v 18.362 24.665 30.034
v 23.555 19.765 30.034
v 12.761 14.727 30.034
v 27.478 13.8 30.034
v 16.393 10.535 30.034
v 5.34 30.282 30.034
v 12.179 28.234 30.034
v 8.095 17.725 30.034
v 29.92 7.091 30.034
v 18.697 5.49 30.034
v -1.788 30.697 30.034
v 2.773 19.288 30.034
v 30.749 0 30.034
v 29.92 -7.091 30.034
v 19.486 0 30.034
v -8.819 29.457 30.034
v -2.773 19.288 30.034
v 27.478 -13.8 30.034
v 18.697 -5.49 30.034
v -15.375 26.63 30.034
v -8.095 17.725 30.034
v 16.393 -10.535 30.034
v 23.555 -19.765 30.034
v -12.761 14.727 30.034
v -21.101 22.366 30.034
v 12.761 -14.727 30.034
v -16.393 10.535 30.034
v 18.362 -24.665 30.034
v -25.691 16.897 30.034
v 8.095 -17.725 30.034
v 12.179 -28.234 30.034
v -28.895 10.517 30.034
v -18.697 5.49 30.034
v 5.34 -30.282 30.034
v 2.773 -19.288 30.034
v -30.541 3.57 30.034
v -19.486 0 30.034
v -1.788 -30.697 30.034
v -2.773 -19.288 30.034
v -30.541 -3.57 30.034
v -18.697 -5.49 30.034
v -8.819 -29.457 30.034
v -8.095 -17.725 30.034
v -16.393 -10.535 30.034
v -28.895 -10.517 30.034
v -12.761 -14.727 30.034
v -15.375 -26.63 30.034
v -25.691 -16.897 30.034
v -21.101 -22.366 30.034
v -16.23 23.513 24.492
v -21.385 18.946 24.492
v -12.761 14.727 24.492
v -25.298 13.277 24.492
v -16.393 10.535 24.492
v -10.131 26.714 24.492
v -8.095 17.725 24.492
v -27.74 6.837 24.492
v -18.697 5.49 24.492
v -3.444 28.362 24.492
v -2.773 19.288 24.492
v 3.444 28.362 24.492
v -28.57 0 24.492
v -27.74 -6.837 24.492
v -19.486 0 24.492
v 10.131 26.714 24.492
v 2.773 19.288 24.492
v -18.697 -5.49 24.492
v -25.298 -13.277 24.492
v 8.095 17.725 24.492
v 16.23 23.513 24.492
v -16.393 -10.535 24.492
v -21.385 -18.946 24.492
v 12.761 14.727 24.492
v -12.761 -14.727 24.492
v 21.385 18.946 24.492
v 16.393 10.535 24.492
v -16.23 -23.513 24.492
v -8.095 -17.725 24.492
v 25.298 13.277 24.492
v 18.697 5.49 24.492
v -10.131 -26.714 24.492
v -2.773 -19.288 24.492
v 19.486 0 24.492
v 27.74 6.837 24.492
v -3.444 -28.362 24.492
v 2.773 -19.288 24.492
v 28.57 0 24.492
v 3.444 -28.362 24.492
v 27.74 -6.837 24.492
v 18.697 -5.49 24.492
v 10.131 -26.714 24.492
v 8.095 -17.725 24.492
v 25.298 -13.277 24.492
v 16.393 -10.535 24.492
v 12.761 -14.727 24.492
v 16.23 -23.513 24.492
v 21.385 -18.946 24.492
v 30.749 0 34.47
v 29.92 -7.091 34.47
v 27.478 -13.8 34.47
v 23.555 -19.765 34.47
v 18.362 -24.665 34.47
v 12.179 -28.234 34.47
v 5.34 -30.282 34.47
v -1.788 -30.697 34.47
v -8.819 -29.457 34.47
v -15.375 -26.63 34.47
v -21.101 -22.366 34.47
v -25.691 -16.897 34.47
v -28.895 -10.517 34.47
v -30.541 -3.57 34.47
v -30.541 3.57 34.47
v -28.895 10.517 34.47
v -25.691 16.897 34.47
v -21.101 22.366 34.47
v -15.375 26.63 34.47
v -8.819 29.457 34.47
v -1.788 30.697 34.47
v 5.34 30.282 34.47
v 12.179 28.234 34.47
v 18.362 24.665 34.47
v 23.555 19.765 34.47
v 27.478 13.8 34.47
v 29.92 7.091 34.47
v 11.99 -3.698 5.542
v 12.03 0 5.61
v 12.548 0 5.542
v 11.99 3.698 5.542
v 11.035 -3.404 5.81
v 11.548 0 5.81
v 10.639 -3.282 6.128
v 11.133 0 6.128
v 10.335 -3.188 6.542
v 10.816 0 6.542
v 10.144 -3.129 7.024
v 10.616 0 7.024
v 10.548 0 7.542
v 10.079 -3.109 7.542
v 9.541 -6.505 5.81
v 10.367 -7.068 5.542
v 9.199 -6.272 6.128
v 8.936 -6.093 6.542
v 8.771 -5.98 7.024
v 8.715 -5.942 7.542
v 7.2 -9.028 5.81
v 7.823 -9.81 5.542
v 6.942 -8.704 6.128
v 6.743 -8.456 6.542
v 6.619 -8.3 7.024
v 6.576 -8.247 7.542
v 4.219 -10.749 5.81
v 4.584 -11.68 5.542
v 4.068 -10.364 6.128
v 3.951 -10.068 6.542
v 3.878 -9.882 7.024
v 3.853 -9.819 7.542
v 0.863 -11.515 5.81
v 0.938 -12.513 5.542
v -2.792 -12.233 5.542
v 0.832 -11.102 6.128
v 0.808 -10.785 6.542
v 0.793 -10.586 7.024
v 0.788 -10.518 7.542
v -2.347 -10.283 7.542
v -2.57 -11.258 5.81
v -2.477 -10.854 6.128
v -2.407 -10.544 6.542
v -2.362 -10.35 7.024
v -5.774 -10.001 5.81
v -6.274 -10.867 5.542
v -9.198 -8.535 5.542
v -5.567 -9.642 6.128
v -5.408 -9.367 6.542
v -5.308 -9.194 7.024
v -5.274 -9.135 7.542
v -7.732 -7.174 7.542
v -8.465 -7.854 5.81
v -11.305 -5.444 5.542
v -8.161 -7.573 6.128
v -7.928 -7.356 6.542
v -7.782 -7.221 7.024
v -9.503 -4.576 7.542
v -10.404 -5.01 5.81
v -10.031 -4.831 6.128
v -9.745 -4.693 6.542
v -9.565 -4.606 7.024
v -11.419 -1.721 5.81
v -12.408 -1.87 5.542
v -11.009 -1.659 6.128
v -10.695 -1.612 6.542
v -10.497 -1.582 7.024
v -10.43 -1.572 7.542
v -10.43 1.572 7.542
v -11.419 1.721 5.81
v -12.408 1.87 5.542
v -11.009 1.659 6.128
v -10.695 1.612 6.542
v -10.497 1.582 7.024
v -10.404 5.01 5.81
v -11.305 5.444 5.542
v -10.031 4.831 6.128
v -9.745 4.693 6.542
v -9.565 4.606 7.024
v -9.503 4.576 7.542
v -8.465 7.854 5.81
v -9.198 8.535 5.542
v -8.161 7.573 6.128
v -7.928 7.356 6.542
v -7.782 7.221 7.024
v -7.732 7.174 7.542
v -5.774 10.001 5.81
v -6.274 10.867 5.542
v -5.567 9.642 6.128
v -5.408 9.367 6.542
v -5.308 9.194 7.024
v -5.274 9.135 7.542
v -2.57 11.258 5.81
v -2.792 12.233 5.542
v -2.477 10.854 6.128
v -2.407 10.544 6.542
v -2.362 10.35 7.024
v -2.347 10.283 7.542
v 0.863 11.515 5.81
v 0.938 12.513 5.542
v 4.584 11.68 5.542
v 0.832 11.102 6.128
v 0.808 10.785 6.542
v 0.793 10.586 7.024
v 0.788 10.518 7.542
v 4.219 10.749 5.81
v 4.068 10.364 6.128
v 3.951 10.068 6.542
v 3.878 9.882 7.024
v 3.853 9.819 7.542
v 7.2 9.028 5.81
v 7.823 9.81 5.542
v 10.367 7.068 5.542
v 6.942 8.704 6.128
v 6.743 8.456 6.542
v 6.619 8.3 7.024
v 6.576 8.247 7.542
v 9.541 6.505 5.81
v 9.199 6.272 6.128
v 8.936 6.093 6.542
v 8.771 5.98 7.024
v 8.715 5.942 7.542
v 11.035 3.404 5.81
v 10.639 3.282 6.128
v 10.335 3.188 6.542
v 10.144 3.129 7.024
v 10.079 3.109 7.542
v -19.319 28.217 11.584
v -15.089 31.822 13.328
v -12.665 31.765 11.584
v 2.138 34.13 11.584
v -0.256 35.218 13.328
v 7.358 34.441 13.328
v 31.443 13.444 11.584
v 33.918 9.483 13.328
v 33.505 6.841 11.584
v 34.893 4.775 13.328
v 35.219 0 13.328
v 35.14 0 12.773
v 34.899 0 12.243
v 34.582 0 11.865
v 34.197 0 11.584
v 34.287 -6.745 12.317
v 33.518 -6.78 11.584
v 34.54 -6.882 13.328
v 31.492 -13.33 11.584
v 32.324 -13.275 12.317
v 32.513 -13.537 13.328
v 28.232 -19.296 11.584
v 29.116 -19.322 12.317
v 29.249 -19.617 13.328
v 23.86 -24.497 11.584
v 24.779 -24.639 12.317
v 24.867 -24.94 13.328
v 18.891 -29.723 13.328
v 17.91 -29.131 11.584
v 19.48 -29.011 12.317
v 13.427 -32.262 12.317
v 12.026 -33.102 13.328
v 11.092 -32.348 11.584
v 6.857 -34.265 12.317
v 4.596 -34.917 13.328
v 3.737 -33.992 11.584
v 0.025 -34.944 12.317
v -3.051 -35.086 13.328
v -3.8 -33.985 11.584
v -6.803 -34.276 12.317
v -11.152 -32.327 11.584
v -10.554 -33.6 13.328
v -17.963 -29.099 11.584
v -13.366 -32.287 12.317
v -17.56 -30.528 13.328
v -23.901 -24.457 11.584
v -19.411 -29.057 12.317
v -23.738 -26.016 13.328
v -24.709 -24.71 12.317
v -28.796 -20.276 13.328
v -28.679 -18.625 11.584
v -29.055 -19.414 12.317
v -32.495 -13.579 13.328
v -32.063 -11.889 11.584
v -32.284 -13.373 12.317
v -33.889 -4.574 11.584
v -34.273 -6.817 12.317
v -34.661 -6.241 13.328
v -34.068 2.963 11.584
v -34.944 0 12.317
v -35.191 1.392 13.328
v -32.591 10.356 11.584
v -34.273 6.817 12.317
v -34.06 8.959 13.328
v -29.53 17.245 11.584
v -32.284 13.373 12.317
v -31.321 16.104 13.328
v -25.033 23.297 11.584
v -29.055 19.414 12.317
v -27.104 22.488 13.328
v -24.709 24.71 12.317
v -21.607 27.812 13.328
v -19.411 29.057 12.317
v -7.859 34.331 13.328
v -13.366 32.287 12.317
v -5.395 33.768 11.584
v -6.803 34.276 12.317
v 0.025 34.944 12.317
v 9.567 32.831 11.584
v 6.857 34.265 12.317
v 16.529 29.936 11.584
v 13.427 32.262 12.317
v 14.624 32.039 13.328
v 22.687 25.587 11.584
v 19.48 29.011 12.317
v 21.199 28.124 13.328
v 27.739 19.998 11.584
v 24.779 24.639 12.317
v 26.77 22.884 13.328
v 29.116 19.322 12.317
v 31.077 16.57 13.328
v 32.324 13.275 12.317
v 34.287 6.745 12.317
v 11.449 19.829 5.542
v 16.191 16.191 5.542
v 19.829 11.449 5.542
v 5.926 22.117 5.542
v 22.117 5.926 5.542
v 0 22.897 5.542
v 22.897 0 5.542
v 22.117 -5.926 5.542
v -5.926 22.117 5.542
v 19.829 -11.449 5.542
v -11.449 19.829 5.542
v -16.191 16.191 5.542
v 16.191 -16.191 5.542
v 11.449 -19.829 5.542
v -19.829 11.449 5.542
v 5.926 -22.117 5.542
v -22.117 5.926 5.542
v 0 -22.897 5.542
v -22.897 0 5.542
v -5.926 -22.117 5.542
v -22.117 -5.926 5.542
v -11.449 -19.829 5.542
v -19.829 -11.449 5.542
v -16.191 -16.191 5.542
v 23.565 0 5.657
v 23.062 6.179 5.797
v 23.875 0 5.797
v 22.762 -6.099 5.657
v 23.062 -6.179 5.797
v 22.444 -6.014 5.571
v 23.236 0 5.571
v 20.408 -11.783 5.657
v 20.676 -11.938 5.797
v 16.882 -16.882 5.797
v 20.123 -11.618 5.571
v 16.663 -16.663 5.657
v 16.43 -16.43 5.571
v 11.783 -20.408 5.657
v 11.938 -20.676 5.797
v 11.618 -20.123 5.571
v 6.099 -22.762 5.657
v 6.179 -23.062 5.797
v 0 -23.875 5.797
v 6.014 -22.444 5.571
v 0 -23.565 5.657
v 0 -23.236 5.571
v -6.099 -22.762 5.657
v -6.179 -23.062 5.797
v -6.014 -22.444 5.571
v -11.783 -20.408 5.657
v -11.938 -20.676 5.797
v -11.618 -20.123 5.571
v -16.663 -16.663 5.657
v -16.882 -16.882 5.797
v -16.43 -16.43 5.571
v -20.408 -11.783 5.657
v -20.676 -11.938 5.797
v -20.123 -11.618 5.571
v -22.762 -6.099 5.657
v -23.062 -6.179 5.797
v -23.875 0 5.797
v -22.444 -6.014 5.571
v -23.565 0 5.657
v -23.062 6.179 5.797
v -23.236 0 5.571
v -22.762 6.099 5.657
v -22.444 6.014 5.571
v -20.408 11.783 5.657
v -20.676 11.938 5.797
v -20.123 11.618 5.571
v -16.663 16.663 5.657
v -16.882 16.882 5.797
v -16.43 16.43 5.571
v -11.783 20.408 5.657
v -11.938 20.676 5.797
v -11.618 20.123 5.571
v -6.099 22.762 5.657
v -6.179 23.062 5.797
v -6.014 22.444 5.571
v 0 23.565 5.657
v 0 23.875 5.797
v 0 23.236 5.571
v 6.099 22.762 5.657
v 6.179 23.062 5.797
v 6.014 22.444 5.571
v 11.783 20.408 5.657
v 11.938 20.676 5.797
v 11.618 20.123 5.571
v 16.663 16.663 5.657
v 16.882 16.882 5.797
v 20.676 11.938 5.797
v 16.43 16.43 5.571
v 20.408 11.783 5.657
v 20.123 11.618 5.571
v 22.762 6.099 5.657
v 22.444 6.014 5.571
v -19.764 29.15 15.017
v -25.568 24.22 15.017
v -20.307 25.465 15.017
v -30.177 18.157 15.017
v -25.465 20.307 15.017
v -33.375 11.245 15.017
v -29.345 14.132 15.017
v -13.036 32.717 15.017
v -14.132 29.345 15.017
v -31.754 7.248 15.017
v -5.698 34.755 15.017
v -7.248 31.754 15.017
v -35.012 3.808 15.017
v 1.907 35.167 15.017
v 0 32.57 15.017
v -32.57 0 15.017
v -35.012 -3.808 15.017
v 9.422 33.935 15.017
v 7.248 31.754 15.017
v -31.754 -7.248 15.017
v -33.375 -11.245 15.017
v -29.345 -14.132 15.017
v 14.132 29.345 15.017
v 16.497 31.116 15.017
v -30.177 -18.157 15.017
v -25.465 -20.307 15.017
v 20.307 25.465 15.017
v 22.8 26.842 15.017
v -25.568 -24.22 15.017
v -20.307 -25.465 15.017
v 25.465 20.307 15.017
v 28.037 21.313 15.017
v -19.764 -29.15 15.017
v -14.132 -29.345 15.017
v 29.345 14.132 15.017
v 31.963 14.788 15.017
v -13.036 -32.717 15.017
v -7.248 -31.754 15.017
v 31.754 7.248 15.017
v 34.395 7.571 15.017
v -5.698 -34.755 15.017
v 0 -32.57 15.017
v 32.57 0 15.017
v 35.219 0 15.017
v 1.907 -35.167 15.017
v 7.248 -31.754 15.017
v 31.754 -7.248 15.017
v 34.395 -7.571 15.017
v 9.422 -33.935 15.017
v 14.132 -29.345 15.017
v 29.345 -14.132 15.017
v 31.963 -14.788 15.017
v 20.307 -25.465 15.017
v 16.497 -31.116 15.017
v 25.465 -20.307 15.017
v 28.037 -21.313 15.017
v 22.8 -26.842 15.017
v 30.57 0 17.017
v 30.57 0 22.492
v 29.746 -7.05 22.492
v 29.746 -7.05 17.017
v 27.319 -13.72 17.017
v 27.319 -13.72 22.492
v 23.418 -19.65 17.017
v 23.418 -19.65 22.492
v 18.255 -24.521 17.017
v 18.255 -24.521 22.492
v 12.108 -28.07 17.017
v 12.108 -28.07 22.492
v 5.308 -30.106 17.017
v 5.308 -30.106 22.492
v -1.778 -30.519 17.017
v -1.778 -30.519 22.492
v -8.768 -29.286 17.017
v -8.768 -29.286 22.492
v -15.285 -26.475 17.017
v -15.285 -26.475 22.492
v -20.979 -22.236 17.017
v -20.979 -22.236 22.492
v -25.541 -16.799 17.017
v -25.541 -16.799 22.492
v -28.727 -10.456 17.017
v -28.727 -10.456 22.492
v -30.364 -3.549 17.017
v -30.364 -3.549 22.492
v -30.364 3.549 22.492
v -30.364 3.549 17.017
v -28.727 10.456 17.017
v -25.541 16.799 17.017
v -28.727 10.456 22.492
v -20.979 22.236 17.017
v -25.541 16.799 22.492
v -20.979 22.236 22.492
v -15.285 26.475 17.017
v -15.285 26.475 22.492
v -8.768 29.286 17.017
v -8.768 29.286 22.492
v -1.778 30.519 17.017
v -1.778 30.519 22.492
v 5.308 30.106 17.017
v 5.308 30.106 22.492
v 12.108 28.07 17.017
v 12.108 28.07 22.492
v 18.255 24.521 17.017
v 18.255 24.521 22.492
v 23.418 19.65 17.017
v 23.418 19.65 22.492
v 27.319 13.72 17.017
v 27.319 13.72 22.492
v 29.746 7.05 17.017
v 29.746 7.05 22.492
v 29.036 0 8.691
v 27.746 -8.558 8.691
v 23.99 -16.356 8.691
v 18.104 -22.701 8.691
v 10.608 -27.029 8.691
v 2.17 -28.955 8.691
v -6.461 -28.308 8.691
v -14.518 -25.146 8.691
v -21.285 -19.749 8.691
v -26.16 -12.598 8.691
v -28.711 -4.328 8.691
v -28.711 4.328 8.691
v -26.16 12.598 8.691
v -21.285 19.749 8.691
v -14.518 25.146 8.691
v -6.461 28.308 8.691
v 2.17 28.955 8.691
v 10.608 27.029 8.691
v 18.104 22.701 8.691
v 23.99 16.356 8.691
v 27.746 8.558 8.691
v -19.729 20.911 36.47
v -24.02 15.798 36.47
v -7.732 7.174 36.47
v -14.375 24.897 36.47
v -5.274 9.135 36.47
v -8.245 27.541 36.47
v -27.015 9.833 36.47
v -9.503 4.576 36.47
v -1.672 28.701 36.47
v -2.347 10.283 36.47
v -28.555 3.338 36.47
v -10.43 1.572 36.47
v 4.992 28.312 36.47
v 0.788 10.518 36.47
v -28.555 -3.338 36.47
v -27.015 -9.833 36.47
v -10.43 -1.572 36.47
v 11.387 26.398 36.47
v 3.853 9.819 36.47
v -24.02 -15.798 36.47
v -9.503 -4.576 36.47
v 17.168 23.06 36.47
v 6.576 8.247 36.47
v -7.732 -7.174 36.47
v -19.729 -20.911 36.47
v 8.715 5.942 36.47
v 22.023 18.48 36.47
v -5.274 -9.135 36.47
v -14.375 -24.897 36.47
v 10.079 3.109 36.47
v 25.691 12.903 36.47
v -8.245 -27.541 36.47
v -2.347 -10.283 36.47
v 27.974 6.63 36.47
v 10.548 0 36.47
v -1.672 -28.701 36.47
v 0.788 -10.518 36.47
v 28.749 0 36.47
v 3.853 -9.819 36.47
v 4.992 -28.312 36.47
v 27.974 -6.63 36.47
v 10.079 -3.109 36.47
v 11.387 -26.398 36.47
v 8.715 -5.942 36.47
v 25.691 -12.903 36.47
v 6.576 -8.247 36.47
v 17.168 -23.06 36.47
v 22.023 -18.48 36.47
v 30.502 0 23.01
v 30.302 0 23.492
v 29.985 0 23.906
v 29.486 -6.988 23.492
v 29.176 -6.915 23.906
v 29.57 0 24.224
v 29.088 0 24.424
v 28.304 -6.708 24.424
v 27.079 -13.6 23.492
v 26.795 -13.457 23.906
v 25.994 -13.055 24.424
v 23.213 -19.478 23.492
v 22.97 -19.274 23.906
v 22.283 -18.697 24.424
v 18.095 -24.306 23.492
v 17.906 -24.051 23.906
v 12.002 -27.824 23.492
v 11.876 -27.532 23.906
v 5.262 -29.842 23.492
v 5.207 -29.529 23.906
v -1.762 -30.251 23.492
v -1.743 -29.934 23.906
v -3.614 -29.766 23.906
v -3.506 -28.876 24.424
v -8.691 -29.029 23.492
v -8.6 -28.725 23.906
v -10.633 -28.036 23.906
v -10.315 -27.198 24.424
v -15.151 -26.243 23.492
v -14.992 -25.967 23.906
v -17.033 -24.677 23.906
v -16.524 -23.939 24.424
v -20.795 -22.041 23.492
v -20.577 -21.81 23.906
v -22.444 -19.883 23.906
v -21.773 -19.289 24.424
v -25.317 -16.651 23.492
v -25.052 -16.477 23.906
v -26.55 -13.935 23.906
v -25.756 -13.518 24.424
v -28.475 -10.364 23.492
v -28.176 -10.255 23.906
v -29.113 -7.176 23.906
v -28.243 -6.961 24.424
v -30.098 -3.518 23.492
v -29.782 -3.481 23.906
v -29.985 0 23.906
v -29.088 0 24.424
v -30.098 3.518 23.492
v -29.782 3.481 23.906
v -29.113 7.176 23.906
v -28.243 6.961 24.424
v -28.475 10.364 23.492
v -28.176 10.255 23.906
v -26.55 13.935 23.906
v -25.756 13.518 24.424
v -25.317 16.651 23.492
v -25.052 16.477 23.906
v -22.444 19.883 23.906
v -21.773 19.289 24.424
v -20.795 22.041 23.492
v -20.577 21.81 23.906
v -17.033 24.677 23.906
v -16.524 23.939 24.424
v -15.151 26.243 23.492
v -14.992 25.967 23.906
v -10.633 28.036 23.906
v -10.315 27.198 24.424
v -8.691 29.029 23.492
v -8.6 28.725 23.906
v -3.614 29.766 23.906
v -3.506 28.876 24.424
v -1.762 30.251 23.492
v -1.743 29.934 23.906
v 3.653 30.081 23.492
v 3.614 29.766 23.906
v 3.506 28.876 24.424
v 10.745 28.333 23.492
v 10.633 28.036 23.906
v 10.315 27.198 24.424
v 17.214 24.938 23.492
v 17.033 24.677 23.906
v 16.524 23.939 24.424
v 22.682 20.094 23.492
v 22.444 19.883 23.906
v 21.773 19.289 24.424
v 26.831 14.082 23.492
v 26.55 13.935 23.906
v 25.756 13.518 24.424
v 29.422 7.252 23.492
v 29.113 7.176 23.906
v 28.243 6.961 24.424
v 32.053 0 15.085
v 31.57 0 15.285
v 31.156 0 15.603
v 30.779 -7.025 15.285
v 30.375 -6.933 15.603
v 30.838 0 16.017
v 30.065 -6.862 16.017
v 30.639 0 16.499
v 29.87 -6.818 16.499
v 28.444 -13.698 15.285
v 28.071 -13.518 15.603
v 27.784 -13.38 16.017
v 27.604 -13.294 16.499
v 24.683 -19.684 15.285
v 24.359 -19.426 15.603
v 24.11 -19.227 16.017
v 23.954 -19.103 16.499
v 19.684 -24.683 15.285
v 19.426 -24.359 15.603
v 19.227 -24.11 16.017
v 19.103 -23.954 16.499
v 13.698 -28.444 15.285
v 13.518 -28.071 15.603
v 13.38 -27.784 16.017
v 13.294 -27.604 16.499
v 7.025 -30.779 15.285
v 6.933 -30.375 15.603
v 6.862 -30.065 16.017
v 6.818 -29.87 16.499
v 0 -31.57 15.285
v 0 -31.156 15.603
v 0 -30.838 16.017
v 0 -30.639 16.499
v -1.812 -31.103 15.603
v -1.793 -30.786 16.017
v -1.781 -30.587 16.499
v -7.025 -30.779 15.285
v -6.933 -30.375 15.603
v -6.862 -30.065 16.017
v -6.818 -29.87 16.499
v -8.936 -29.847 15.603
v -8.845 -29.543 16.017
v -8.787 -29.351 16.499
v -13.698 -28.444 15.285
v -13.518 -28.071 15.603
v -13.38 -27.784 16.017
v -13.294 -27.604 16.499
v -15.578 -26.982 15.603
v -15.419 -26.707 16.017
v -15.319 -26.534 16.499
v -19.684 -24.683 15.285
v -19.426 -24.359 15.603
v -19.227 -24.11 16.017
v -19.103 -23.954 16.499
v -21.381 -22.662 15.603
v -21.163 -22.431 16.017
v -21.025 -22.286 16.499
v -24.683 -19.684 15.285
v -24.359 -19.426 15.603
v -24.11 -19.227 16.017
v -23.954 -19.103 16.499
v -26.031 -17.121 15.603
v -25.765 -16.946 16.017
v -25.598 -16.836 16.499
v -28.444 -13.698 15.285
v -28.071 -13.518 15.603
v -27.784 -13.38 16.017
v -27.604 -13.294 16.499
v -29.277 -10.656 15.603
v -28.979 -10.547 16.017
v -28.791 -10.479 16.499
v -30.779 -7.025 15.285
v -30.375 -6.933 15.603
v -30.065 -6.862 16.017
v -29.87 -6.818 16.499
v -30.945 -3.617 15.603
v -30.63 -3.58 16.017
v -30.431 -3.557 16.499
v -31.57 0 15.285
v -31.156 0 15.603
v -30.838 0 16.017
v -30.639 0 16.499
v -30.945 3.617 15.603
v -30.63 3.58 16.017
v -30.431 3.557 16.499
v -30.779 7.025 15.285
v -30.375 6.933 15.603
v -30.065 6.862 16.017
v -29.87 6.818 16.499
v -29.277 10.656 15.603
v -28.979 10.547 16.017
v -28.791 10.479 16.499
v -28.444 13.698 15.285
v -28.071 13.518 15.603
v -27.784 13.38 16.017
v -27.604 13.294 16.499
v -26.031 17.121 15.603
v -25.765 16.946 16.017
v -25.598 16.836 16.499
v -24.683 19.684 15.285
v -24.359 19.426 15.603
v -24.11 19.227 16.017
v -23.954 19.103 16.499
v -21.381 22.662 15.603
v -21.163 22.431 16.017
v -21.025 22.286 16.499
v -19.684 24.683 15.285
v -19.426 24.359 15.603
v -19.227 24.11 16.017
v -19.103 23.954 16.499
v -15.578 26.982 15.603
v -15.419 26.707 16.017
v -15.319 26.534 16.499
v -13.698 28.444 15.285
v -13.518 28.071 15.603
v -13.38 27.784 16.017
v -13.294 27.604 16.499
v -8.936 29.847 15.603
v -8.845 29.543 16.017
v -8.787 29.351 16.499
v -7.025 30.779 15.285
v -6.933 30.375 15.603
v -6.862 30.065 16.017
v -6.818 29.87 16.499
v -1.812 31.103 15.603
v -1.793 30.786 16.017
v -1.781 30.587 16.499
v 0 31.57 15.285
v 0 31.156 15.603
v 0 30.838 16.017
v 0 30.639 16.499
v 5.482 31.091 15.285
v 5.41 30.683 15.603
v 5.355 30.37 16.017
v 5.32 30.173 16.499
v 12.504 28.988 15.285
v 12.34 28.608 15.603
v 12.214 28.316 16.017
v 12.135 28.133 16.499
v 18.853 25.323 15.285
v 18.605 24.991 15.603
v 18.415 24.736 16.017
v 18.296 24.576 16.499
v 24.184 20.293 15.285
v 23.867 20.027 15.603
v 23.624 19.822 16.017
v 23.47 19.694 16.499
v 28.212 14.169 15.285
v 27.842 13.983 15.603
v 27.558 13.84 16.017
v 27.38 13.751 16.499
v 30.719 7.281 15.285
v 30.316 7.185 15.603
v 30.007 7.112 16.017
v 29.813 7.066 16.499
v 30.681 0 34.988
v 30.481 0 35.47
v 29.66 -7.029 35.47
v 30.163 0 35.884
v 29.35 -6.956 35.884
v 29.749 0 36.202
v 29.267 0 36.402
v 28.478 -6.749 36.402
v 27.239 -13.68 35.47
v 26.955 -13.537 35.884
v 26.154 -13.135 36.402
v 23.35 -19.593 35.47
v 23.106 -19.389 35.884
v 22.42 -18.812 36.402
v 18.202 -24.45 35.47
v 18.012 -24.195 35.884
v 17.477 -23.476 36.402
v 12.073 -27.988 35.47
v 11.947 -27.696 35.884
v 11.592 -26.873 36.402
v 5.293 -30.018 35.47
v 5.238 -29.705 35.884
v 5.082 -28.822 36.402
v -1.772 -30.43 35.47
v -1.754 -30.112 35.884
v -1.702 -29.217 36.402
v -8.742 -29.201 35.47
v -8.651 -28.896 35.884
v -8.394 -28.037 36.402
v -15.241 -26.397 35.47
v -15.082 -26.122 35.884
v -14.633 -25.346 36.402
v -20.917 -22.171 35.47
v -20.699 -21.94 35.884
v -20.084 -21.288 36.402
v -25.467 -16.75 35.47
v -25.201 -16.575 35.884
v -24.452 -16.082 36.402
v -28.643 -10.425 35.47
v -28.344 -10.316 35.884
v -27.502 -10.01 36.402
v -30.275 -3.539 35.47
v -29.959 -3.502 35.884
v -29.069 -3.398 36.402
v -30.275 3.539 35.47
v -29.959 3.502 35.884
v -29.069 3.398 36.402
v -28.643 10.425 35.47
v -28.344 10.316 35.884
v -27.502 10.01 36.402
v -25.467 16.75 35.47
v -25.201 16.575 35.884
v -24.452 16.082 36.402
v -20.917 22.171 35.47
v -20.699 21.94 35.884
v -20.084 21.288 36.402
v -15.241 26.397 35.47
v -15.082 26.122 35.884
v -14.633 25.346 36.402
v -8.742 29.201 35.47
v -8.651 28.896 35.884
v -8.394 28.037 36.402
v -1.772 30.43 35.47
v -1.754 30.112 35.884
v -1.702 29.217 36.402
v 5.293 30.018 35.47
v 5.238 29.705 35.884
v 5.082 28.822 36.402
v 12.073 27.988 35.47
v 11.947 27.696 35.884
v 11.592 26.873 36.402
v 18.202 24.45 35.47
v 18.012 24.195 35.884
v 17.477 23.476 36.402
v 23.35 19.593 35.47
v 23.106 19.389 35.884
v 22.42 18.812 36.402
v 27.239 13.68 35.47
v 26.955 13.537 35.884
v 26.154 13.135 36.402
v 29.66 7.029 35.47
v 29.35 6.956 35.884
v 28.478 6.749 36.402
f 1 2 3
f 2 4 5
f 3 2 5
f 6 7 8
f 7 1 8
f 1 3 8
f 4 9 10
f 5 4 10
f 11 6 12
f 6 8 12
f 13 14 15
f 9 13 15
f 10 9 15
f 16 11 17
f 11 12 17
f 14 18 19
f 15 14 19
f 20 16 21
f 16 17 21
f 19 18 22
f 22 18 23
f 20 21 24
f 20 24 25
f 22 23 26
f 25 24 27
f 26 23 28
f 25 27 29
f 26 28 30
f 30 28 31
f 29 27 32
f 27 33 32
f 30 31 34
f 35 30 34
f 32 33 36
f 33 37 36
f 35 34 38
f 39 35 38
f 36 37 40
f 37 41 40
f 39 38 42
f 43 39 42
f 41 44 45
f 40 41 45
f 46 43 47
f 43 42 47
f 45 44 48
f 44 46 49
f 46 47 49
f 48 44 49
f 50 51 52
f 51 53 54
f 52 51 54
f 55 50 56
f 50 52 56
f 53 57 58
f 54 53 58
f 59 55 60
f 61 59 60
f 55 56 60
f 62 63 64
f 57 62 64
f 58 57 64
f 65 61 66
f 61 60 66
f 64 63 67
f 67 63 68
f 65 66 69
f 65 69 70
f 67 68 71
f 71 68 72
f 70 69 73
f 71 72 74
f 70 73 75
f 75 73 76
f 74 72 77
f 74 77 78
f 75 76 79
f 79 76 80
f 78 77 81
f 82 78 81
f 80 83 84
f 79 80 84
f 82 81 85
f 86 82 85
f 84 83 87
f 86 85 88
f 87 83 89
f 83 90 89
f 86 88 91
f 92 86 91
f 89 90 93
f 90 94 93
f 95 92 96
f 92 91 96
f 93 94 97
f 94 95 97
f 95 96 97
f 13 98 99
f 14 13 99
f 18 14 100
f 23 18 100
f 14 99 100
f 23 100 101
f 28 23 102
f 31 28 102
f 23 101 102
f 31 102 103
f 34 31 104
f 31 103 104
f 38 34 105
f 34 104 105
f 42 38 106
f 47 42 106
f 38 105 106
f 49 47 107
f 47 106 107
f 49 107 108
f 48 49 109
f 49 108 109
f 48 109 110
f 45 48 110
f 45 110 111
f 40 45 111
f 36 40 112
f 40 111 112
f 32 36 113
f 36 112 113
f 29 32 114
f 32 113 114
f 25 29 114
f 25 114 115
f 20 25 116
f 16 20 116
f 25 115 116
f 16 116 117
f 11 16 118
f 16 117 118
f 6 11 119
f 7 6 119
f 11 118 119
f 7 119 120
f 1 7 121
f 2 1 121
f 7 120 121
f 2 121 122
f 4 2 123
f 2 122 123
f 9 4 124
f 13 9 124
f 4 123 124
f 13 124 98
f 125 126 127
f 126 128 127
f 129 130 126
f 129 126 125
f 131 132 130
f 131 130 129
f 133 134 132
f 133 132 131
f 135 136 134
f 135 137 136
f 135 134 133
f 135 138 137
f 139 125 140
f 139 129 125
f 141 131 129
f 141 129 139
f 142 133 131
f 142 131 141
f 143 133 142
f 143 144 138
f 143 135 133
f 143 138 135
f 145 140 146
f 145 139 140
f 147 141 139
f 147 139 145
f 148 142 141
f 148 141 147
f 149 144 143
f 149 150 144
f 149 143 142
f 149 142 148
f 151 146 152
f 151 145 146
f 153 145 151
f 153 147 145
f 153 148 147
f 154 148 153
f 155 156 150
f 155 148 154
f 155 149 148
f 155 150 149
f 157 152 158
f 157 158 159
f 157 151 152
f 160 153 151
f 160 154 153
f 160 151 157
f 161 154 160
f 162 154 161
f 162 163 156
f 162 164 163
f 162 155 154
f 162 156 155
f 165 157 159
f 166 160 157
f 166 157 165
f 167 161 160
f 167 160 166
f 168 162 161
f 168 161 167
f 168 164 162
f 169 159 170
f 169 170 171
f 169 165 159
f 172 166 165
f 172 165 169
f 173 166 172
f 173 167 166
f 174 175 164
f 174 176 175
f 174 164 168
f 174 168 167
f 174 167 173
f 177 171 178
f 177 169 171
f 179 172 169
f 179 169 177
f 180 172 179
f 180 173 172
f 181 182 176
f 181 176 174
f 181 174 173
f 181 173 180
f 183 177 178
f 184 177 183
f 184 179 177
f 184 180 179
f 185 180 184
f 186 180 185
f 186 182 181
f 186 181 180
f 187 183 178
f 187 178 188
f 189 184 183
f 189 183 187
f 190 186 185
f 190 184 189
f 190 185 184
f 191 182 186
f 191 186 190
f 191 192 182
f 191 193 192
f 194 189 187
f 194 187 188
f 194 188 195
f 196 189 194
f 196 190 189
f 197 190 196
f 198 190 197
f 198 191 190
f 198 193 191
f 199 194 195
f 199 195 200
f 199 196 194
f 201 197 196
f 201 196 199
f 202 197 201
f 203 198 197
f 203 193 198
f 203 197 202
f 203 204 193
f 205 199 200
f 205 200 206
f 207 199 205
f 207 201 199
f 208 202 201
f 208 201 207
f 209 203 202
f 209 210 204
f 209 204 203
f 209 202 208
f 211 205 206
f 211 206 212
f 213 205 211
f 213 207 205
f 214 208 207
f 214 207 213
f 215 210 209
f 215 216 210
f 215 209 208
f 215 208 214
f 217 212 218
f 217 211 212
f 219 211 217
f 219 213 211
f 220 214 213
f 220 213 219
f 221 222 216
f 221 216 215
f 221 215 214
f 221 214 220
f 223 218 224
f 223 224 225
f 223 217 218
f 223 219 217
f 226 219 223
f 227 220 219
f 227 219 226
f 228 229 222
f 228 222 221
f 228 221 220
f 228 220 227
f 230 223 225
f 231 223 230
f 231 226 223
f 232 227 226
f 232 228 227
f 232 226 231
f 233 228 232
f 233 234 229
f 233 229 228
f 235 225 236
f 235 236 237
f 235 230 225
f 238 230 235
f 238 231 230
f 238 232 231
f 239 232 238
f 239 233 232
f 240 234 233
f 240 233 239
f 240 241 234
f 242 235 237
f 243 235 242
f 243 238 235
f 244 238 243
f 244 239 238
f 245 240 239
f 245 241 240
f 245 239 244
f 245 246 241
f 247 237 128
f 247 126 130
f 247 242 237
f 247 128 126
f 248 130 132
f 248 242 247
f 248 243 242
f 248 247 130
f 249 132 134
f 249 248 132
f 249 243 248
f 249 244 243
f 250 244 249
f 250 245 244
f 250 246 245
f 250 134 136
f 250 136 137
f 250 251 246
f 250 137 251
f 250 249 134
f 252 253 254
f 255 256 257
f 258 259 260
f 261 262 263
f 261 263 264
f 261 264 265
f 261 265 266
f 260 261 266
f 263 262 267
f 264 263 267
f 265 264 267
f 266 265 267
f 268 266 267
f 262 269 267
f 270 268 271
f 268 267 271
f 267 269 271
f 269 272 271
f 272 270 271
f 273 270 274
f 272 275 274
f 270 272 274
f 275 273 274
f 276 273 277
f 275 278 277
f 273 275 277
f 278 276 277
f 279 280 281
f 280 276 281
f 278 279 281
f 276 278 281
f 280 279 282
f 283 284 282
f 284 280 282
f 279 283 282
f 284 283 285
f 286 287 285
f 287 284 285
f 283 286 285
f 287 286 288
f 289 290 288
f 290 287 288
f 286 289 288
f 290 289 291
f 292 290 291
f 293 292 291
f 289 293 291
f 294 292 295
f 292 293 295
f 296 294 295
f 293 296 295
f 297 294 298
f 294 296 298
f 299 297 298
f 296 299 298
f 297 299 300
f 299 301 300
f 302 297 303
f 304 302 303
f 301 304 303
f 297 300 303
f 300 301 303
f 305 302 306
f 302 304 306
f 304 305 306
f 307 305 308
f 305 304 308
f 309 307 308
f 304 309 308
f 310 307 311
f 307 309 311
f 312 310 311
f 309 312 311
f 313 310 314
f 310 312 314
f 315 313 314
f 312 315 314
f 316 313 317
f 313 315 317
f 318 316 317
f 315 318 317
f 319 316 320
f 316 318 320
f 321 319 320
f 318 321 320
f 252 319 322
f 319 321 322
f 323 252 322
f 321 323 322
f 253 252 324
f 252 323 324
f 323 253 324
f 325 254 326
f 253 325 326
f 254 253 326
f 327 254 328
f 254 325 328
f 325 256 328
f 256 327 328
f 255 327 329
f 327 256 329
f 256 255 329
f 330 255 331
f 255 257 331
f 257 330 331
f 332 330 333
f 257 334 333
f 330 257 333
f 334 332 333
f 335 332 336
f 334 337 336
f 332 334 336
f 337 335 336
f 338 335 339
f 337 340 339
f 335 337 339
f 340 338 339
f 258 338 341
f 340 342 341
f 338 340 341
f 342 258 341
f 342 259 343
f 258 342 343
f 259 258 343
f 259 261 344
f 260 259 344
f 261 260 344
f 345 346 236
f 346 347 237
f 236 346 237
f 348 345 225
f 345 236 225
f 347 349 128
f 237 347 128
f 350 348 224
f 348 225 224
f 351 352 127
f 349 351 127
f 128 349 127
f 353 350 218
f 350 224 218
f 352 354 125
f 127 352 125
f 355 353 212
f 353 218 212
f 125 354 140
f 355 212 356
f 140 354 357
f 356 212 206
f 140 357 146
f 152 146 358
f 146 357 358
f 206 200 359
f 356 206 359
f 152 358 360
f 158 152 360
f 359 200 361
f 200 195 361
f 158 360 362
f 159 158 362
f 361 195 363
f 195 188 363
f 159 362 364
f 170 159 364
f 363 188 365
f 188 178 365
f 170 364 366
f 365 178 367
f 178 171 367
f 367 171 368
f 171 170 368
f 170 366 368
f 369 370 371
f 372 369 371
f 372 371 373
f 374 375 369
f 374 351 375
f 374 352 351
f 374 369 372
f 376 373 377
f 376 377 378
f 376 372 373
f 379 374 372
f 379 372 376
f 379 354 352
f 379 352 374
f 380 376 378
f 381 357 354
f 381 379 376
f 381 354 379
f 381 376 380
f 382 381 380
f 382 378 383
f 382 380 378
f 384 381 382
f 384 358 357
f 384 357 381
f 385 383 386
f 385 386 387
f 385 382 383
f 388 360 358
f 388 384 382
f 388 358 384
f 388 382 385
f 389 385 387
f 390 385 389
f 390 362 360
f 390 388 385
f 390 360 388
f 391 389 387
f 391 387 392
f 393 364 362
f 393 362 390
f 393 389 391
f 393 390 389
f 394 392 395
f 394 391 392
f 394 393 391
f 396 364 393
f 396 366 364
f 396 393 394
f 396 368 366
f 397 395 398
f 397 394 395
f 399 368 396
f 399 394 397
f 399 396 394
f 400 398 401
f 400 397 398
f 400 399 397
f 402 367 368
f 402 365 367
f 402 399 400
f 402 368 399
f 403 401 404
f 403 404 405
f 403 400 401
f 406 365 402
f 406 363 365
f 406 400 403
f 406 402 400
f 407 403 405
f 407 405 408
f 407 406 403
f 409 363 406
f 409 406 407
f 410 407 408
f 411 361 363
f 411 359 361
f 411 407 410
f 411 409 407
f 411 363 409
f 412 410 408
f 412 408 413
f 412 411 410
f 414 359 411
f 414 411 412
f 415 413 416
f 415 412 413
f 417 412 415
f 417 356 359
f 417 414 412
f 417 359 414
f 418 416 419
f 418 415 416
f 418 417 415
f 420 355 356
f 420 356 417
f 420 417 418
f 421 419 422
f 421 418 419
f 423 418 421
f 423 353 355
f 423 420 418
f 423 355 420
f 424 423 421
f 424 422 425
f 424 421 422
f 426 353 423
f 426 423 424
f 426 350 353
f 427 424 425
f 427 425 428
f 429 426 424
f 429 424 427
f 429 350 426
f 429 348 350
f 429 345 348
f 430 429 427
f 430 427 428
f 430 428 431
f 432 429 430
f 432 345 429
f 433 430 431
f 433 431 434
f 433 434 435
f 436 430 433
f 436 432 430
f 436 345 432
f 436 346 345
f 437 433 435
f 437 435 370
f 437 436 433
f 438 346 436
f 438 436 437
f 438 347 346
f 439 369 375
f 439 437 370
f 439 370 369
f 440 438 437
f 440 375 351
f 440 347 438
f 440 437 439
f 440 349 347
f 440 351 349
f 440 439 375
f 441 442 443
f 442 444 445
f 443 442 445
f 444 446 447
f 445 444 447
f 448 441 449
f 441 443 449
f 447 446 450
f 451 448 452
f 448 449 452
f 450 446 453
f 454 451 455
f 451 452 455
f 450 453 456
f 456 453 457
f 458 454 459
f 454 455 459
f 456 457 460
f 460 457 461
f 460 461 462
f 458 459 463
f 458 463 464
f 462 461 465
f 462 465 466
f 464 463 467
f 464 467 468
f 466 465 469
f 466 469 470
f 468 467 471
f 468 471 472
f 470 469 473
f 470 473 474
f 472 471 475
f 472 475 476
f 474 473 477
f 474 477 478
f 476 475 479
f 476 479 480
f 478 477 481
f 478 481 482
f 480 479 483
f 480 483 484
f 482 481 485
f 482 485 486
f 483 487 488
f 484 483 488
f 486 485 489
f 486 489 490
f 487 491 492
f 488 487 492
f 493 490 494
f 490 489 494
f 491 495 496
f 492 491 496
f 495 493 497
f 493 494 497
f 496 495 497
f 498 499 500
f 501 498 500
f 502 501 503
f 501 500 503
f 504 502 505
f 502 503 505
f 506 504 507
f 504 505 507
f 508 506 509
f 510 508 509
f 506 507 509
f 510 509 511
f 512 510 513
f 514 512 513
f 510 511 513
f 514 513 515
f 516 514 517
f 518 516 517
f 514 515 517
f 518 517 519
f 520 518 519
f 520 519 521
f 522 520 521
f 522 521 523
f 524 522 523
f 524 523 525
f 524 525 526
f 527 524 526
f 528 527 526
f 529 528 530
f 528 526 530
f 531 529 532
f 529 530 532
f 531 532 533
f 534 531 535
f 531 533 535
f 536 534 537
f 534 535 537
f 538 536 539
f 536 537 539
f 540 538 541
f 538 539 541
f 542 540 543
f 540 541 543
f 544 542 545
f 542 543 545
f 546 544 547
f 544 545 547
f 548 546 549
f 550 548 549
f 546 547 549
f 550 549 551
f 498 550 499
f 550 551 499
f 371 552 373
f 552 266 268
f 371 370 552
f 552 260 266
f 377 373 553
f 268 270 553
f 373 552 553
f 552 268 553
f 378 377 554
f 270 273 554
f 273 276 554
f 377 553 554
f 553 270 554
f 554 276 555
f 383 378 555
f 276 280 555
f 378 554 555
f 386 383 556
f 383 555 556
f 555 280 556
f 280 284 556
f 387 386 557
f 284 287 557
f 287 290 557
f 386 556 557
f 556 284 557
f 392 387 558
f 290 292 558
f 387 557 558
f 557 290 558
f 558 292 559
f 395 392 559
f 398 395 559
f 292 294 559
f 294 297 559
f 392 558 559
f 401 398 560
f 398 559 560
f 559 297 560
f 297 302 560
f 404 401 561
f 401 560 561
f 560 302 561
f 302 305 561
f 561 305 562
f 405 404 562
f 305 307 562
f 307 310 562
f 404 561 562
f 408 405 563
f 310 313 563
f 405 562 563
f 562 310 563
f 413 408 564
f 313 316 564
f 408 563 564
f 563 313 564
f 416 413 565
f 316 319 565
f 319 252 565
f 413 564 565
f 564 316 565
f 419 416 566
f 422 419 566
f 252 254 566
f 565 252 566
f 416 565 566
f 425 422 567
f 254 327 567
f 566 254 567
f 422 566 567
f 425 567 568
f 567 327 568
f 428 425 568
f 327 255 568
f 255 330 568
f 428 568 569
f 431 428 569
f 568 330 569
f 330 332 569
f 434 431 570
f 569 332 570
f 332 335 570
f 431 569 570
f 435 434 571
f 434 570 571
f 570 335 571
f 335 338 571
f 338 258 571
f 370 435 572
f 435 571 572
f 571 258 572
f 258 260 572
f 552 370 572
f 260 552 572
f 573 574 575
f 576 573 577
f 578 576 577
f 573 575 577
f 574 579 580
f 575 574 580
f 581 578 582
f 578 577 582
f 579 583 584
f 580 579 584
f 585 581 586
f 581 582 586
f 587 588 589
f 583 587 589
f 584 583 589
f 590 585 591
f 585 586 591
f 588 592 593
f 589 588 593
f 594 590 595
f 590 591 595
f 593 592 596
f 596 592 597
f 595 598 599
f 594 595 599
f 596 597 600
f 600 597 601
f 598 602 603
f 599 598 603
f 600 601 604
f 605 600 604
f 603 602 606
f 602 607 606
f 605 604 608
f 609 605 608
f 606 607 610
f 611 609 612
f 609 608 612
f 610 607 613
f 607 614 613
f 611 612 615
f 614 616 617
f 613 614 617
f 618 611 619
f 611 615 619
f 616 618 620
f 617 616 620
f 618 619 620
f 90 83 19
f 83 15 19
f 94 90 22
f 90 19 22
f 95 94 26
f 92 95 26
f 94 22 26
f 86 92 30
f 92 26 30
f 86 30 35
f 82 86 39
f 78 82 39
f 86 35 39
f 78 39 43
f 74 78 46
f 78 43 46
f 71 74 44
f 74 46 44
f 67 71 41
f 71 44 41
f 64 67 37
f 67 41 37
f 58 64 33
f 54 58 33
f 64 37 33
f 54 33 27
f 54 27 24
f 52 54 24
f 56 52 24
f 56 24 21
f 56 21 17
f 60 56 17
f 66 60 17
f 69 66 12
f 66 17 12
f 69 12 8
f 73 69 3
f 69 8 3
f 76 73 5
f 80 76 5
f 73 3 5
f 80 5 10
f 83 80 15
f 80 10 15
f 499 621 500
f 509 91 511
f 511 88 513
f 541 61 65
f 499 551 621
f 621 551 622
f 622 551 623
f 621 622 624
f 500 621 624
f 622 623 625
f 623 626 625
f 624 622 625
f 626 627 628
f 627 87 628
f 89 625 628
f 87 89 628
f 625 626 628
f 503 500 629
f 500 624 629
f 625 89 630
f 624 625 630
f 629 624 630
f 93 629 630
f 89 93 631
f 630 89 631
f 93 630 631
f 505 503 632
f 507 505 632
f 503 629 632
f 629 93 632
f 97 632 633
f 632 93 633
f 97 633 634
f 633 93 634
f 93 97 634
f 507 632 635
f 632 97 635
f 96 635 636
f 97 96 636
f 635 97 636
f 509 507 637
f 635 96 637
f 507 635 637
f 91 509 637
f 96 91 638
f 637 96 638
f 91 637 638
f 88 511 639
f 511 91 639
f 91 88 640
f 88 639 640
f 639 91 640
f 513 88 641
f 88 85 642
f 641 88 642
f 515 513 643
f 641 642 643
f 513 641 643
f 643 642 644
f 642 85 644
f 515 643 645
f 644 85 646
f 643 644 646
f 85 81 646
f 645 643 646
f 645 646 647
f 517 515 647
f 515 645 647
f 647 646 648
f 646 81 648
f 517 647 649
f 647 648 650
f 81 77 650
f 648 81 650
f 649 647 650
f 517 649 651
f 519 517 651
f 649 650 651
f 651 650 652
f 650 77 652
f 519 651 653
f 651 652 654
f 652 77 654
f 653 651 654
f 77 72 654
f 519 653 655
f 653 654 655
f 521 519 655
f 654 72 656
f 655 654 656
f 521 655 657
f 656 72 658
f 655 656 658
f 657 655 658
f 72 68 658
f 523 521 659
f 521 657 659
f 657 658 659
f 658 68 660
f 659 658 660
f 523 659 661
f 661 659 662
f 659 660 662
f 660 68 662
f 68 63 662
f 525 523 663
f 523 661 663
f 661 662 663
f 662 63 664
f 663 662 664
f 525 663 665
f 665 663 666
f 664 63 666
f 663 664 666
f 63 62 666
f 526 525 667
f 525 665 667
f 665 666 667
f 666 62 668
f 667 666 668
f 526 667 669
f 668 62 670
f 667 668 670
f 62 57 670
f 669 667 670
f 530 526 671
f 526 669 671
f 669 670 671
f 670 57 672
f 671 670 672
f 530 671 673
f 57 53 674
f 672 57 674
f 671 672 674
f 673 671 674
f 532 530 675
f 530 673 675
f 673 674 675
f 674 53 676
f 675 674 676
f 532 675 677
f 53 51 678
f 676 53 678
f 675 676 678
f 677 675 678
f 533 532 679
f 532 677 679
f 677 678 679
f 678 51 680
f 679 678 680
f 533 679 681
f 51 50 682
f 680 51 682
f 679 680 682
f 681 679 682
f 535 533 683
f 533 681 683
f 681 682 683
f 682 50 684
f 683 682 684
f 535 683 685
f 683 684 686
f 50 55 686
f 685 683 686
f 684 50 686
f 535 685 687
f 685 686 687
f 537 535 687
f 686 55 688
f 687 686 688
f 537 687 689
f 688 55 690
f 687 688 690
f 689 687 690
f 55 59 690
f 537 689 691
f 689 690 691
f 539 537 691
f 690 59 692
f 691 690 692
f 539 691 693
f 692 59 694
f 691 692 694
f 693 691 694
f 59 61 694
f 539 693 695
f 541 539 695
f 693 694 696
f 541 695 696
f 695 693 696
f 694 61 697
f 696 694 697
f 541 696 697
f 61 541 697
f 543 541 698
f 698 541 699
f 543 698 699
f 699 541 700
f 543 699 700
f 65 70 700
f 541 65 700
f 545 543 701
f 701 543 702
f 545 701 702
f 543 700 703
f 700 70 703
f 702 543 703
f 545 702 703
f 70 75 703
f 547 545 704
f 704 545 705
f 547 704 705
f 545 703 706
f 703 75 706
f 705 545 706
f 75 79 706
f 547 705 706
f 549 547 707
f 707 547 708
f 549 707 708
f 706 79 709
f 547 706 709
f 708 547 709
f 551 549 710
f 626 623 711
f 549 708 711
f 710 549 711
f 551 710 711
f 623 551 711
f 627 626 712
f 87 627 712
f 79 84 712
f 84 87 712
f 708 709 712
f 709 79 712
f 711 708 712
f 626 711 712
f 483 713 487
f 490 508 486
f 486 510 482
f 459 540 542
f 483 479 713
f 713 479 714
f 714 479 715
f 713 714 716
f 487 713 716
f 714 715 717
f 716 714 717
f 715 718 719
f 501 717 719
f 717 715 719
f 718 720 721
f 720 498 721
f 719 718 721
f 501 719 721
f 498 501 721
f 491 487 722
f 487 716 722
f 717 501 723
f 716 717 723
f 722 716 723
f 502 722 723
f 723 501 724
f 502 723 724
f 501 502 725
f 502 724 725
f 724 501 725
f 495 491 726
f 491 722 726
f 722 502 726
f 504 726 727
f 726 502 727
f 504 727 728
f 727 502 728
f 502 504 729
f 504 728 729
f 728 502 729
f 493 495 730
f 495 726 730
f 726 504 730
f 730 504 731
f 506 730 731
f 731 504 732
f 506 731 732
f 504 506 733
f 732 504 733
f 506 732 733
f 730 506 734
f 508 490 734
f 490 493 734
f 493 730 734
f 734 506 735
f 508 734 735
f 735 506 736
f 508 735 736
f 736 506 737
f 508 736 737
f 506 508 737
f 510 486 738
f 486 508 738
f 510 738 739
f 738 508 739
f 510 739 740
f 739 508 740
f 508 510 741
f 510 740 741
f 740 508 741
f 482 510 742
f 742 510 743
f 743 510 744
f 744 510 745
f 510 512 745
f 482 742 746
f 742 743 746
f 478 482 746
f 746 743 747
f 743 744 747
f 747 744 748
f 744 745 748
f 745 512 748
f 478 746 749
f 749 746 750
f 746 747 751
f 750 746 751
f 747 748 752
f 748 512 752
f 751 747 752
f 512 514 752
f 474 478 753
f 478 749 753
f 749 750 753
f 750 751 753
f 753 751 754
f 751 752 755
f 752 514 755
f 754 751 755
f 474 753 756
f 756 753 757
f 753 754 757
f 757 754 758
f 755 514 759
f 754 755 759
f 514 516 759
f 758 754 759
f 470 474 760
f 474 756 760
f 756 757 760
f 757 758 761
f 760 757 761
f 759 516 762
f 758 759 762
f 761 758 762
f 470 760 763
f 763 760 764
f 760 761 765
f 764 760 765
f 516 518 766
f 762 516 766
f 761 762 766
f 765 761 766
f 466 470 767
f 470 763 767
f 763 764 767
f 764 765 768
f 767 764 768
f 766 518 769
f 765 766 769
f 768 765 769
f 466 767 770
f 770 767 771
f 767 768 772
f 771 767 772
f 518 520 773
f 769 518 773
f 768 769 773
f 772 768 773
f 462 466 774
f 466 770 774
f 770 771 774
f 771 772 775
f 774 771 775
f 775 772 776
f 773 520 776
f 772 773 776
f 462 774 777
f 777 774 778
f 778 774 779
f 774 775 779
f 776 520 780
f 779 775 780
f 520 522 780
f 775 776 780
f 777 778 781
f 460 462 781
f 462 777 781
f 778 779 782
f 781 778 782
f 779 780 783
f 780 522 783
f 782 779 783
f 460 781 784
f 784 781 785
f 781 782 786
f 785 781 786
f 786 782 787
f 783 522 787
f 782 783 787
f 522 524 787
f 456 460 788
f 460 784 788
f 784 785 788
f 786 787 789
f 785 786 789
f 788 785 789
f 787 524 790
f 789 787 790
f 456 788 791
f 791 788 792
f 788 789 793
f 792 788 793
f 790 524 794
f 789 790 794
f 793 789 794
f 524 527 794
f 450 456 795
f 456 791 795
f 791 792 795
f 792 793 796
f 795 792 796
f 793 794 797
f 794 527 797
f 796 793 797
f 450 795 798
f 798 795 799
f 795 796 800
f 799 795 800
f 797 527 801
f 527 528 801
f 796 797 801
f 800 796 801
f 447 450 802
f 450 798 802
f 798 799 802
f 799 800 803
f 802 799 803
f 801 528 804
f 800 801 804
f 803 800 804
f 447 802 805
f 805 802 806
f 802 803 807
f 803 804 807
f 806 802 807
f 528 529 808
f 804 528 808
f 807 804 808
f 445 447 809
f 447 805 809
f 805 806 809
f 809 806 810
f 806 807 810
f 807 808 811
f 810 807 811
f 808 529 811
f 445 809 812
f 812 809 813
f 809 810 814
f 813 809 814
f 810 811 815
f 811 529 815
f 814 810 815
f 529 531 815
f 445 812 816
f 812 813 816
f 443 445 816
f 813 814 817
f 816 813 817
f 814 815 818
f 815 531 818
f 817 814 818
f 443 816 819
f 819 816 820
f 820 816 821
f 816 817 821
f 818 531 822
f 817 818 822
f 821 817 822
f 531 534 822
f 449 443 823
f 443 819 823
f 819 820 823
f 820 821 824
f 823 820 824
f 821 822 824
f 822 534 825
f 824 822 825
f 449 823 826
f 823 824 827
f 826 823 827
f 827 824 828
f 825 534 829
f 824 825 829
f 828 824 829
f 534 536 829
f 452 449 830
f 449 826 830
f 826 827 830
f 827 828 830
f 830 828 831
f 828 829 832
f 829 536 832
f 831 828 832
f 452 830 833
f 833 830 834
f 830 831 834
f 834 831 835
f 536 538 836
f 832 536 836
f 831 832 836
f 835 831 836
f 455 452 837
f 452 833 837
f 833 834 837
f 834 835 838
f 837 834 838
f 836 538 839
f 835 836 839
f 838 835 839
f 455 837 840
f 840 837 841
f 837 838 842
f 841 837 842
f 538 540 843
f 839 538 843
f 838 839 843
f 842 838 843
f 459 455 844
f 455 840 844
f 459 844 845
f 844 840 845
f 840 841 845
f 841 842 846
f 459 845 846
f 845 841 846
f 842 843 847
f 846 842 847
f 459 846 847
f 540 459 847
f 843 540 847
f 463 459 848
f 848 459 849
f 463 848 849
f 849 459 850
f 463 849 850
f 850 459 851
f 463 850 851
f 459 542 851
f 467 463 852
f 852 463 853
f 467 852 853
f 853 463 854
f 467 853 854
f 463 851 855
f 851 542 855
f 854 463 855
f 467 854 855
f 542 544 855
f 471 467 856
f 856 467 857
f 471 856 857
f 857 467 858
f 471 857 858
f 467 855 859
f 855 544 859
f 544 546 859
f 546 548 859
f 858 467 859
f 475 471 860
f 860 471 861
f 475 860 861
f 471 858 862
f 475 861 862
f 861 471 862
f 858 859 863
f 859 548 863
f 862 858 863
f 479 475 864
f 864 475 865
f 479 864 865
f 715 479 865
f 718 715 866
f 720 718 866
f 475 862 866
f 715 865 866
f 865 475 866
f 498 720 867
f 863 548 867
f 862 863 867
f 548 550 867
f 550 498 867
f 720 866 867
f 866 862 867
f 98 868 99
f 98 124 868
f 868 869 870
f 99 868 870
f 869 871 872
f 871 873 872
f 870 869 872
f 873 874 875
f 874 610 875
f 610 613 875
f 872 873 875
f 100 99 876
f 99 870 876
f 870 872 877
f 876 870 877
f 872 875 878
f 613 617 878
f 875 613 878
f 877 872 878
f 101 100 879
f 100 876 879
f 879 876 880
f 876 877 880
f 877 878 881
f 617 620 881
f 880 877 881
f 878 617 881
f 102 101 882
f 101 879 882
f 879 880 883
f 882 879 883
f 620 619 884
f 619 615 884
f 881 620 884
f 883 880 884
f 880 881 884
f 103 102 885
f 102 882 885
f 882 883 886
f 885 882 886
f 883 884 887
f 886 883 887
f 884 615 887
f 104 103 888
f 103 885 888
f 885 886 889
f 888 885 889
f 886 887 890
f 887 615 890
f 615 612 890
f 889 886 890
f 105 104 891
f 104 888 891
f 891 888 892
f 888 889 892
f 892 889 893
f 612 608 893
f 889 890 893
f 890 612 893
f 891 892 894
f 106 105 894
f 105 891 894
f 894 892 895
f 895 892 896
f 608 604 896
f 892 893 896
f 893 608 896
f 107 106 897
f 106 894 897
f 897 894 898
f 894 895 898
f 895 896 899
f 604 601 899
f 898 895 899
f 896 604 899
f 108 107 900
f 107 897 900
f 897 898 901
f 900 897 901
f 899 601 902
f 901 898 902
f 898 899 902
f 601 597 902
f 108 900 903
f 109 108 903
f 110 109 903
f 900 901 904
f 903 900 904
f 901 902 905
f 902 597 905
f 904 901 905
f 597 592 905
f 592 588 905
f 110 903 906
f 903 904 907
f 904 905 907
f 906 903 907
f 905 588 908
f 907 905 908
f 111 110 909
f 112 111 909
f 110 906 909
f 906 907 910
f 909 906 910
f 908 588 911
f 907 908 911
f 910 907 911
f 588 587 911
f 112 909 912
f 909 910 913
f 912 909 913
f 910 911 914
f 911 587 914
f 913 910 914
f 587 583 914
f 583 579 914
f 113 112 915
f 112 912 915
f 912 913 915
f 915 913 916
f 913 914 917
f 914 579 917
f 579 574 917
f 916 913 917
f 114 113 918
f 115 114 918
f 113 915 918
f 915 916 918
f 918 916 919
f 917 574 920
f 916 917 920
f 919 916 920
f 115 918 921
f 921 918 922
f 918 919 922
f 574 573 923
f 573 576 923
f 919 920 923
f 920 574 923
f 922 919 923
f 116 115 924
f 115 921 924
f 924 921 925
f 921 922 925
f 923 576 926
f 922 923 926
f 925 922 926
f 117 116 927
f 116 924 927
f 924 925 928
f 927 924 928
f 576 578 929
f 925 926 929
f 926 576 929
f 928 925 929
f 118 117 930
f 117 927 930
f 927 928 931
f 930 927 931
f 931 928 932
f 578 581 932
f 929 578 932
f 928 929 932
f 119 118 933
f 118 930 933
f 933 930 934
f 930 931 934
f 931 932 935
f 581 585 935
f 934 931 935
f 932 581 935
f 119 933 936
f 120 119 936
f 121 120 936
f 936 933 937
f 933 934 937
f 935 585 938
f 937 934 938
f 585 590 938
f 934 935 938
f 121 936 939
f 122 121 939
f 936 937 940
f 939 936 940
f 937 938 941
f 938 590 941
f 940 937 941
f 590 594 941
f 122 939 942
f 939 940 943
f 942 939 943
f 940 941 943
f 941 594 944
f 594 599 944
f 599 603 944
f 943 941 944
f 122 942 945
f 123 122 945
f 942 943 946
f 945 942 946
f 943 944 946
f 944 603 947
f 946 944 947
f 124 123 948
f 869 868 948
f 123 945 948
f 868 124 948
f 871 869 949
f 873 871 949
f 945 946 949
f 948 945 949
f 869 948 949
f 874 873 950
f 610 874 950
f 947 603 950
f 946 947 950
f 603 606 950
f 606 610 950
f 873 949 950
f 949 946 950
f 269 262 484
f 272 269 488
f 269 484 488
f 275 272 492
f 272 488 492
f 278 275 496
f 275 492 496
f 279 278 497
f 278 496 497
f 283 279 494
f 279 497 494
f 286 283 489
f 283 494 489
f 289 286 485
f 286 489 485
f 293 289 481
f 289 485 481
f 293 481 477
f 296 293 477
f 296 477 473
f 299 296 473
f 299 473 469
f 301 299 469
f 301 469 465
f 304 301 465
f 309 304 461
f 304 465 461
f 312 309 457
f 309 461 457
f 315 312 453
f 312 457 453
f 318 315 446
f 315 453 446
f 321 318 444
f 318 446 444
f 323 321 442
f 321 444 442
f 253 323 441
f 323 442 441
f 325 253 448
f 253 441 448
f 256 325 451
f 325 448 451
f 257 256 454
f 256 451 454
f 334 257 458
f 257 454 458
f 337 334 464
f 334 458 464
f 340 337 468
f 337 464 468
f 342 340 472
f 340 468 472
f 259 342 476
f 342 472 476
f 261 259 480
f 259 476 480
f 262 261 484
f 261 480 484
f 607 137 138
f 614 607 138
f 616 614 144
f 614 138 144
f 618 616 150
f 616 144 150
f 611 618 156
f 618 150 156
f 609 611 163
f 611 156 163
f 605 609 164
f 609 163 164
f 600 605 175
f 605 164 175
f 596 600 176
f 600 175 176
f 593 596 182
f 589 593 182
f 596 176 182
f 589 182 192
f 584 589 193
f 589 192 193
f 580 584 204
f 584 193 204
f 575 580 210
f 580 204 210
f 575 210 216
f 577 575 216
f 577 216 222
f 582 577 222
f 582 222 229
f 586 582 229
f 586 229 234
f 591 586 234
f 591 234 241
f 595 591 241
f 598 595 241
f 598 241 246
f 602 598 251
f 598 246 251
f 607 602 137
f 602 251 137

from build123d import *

# Parameters (mm, degrees)
F2_R = 2
F3_R = 2


with BuildPart() as f1:
    # F0 (on Front) → F1 (revolve)
    with BuildSketch(Plane.XZ):
        Polygon((10.547672, 36.469921), (10.547672, 5.541999), (23.41941, 5.541999), (35.218503, 12.156641), (35.218503, 15.017027), (30.570375, 15.017027), (30.570375, 24.492055), (19.486379, 24.492055), (19.486379, 30.034054), (30.749151, 30.034054), (30.749151, 36.469921), align=None)
    revolve(axis=Axis((0, 0, 5.541999), (0, 0, -1)))

    # F2
    f2_edges = [f1.edges().sort_by_distance(p)[0] for p in [
        (-30.749151, 0, 36.469921),
        (-30.570375, 0, 15.017027),
        (-30.570375, 0, 24.492055),
        (30.570375, 0, 19.754541),
    ]]
    fillet(f2_edges, radius=F2_R)

    # F3
    f3_edges = [f1.edges().sort_by_distance(p)[0] for p in [
        (-35.218503, 0, 12.156641),
        (-23.41941, 0, 5.541999),
        (-10.547672, 0, 5.541999),
    ]]
    fillet(f3_edges, radius=F3_R)


solid = f1.part
